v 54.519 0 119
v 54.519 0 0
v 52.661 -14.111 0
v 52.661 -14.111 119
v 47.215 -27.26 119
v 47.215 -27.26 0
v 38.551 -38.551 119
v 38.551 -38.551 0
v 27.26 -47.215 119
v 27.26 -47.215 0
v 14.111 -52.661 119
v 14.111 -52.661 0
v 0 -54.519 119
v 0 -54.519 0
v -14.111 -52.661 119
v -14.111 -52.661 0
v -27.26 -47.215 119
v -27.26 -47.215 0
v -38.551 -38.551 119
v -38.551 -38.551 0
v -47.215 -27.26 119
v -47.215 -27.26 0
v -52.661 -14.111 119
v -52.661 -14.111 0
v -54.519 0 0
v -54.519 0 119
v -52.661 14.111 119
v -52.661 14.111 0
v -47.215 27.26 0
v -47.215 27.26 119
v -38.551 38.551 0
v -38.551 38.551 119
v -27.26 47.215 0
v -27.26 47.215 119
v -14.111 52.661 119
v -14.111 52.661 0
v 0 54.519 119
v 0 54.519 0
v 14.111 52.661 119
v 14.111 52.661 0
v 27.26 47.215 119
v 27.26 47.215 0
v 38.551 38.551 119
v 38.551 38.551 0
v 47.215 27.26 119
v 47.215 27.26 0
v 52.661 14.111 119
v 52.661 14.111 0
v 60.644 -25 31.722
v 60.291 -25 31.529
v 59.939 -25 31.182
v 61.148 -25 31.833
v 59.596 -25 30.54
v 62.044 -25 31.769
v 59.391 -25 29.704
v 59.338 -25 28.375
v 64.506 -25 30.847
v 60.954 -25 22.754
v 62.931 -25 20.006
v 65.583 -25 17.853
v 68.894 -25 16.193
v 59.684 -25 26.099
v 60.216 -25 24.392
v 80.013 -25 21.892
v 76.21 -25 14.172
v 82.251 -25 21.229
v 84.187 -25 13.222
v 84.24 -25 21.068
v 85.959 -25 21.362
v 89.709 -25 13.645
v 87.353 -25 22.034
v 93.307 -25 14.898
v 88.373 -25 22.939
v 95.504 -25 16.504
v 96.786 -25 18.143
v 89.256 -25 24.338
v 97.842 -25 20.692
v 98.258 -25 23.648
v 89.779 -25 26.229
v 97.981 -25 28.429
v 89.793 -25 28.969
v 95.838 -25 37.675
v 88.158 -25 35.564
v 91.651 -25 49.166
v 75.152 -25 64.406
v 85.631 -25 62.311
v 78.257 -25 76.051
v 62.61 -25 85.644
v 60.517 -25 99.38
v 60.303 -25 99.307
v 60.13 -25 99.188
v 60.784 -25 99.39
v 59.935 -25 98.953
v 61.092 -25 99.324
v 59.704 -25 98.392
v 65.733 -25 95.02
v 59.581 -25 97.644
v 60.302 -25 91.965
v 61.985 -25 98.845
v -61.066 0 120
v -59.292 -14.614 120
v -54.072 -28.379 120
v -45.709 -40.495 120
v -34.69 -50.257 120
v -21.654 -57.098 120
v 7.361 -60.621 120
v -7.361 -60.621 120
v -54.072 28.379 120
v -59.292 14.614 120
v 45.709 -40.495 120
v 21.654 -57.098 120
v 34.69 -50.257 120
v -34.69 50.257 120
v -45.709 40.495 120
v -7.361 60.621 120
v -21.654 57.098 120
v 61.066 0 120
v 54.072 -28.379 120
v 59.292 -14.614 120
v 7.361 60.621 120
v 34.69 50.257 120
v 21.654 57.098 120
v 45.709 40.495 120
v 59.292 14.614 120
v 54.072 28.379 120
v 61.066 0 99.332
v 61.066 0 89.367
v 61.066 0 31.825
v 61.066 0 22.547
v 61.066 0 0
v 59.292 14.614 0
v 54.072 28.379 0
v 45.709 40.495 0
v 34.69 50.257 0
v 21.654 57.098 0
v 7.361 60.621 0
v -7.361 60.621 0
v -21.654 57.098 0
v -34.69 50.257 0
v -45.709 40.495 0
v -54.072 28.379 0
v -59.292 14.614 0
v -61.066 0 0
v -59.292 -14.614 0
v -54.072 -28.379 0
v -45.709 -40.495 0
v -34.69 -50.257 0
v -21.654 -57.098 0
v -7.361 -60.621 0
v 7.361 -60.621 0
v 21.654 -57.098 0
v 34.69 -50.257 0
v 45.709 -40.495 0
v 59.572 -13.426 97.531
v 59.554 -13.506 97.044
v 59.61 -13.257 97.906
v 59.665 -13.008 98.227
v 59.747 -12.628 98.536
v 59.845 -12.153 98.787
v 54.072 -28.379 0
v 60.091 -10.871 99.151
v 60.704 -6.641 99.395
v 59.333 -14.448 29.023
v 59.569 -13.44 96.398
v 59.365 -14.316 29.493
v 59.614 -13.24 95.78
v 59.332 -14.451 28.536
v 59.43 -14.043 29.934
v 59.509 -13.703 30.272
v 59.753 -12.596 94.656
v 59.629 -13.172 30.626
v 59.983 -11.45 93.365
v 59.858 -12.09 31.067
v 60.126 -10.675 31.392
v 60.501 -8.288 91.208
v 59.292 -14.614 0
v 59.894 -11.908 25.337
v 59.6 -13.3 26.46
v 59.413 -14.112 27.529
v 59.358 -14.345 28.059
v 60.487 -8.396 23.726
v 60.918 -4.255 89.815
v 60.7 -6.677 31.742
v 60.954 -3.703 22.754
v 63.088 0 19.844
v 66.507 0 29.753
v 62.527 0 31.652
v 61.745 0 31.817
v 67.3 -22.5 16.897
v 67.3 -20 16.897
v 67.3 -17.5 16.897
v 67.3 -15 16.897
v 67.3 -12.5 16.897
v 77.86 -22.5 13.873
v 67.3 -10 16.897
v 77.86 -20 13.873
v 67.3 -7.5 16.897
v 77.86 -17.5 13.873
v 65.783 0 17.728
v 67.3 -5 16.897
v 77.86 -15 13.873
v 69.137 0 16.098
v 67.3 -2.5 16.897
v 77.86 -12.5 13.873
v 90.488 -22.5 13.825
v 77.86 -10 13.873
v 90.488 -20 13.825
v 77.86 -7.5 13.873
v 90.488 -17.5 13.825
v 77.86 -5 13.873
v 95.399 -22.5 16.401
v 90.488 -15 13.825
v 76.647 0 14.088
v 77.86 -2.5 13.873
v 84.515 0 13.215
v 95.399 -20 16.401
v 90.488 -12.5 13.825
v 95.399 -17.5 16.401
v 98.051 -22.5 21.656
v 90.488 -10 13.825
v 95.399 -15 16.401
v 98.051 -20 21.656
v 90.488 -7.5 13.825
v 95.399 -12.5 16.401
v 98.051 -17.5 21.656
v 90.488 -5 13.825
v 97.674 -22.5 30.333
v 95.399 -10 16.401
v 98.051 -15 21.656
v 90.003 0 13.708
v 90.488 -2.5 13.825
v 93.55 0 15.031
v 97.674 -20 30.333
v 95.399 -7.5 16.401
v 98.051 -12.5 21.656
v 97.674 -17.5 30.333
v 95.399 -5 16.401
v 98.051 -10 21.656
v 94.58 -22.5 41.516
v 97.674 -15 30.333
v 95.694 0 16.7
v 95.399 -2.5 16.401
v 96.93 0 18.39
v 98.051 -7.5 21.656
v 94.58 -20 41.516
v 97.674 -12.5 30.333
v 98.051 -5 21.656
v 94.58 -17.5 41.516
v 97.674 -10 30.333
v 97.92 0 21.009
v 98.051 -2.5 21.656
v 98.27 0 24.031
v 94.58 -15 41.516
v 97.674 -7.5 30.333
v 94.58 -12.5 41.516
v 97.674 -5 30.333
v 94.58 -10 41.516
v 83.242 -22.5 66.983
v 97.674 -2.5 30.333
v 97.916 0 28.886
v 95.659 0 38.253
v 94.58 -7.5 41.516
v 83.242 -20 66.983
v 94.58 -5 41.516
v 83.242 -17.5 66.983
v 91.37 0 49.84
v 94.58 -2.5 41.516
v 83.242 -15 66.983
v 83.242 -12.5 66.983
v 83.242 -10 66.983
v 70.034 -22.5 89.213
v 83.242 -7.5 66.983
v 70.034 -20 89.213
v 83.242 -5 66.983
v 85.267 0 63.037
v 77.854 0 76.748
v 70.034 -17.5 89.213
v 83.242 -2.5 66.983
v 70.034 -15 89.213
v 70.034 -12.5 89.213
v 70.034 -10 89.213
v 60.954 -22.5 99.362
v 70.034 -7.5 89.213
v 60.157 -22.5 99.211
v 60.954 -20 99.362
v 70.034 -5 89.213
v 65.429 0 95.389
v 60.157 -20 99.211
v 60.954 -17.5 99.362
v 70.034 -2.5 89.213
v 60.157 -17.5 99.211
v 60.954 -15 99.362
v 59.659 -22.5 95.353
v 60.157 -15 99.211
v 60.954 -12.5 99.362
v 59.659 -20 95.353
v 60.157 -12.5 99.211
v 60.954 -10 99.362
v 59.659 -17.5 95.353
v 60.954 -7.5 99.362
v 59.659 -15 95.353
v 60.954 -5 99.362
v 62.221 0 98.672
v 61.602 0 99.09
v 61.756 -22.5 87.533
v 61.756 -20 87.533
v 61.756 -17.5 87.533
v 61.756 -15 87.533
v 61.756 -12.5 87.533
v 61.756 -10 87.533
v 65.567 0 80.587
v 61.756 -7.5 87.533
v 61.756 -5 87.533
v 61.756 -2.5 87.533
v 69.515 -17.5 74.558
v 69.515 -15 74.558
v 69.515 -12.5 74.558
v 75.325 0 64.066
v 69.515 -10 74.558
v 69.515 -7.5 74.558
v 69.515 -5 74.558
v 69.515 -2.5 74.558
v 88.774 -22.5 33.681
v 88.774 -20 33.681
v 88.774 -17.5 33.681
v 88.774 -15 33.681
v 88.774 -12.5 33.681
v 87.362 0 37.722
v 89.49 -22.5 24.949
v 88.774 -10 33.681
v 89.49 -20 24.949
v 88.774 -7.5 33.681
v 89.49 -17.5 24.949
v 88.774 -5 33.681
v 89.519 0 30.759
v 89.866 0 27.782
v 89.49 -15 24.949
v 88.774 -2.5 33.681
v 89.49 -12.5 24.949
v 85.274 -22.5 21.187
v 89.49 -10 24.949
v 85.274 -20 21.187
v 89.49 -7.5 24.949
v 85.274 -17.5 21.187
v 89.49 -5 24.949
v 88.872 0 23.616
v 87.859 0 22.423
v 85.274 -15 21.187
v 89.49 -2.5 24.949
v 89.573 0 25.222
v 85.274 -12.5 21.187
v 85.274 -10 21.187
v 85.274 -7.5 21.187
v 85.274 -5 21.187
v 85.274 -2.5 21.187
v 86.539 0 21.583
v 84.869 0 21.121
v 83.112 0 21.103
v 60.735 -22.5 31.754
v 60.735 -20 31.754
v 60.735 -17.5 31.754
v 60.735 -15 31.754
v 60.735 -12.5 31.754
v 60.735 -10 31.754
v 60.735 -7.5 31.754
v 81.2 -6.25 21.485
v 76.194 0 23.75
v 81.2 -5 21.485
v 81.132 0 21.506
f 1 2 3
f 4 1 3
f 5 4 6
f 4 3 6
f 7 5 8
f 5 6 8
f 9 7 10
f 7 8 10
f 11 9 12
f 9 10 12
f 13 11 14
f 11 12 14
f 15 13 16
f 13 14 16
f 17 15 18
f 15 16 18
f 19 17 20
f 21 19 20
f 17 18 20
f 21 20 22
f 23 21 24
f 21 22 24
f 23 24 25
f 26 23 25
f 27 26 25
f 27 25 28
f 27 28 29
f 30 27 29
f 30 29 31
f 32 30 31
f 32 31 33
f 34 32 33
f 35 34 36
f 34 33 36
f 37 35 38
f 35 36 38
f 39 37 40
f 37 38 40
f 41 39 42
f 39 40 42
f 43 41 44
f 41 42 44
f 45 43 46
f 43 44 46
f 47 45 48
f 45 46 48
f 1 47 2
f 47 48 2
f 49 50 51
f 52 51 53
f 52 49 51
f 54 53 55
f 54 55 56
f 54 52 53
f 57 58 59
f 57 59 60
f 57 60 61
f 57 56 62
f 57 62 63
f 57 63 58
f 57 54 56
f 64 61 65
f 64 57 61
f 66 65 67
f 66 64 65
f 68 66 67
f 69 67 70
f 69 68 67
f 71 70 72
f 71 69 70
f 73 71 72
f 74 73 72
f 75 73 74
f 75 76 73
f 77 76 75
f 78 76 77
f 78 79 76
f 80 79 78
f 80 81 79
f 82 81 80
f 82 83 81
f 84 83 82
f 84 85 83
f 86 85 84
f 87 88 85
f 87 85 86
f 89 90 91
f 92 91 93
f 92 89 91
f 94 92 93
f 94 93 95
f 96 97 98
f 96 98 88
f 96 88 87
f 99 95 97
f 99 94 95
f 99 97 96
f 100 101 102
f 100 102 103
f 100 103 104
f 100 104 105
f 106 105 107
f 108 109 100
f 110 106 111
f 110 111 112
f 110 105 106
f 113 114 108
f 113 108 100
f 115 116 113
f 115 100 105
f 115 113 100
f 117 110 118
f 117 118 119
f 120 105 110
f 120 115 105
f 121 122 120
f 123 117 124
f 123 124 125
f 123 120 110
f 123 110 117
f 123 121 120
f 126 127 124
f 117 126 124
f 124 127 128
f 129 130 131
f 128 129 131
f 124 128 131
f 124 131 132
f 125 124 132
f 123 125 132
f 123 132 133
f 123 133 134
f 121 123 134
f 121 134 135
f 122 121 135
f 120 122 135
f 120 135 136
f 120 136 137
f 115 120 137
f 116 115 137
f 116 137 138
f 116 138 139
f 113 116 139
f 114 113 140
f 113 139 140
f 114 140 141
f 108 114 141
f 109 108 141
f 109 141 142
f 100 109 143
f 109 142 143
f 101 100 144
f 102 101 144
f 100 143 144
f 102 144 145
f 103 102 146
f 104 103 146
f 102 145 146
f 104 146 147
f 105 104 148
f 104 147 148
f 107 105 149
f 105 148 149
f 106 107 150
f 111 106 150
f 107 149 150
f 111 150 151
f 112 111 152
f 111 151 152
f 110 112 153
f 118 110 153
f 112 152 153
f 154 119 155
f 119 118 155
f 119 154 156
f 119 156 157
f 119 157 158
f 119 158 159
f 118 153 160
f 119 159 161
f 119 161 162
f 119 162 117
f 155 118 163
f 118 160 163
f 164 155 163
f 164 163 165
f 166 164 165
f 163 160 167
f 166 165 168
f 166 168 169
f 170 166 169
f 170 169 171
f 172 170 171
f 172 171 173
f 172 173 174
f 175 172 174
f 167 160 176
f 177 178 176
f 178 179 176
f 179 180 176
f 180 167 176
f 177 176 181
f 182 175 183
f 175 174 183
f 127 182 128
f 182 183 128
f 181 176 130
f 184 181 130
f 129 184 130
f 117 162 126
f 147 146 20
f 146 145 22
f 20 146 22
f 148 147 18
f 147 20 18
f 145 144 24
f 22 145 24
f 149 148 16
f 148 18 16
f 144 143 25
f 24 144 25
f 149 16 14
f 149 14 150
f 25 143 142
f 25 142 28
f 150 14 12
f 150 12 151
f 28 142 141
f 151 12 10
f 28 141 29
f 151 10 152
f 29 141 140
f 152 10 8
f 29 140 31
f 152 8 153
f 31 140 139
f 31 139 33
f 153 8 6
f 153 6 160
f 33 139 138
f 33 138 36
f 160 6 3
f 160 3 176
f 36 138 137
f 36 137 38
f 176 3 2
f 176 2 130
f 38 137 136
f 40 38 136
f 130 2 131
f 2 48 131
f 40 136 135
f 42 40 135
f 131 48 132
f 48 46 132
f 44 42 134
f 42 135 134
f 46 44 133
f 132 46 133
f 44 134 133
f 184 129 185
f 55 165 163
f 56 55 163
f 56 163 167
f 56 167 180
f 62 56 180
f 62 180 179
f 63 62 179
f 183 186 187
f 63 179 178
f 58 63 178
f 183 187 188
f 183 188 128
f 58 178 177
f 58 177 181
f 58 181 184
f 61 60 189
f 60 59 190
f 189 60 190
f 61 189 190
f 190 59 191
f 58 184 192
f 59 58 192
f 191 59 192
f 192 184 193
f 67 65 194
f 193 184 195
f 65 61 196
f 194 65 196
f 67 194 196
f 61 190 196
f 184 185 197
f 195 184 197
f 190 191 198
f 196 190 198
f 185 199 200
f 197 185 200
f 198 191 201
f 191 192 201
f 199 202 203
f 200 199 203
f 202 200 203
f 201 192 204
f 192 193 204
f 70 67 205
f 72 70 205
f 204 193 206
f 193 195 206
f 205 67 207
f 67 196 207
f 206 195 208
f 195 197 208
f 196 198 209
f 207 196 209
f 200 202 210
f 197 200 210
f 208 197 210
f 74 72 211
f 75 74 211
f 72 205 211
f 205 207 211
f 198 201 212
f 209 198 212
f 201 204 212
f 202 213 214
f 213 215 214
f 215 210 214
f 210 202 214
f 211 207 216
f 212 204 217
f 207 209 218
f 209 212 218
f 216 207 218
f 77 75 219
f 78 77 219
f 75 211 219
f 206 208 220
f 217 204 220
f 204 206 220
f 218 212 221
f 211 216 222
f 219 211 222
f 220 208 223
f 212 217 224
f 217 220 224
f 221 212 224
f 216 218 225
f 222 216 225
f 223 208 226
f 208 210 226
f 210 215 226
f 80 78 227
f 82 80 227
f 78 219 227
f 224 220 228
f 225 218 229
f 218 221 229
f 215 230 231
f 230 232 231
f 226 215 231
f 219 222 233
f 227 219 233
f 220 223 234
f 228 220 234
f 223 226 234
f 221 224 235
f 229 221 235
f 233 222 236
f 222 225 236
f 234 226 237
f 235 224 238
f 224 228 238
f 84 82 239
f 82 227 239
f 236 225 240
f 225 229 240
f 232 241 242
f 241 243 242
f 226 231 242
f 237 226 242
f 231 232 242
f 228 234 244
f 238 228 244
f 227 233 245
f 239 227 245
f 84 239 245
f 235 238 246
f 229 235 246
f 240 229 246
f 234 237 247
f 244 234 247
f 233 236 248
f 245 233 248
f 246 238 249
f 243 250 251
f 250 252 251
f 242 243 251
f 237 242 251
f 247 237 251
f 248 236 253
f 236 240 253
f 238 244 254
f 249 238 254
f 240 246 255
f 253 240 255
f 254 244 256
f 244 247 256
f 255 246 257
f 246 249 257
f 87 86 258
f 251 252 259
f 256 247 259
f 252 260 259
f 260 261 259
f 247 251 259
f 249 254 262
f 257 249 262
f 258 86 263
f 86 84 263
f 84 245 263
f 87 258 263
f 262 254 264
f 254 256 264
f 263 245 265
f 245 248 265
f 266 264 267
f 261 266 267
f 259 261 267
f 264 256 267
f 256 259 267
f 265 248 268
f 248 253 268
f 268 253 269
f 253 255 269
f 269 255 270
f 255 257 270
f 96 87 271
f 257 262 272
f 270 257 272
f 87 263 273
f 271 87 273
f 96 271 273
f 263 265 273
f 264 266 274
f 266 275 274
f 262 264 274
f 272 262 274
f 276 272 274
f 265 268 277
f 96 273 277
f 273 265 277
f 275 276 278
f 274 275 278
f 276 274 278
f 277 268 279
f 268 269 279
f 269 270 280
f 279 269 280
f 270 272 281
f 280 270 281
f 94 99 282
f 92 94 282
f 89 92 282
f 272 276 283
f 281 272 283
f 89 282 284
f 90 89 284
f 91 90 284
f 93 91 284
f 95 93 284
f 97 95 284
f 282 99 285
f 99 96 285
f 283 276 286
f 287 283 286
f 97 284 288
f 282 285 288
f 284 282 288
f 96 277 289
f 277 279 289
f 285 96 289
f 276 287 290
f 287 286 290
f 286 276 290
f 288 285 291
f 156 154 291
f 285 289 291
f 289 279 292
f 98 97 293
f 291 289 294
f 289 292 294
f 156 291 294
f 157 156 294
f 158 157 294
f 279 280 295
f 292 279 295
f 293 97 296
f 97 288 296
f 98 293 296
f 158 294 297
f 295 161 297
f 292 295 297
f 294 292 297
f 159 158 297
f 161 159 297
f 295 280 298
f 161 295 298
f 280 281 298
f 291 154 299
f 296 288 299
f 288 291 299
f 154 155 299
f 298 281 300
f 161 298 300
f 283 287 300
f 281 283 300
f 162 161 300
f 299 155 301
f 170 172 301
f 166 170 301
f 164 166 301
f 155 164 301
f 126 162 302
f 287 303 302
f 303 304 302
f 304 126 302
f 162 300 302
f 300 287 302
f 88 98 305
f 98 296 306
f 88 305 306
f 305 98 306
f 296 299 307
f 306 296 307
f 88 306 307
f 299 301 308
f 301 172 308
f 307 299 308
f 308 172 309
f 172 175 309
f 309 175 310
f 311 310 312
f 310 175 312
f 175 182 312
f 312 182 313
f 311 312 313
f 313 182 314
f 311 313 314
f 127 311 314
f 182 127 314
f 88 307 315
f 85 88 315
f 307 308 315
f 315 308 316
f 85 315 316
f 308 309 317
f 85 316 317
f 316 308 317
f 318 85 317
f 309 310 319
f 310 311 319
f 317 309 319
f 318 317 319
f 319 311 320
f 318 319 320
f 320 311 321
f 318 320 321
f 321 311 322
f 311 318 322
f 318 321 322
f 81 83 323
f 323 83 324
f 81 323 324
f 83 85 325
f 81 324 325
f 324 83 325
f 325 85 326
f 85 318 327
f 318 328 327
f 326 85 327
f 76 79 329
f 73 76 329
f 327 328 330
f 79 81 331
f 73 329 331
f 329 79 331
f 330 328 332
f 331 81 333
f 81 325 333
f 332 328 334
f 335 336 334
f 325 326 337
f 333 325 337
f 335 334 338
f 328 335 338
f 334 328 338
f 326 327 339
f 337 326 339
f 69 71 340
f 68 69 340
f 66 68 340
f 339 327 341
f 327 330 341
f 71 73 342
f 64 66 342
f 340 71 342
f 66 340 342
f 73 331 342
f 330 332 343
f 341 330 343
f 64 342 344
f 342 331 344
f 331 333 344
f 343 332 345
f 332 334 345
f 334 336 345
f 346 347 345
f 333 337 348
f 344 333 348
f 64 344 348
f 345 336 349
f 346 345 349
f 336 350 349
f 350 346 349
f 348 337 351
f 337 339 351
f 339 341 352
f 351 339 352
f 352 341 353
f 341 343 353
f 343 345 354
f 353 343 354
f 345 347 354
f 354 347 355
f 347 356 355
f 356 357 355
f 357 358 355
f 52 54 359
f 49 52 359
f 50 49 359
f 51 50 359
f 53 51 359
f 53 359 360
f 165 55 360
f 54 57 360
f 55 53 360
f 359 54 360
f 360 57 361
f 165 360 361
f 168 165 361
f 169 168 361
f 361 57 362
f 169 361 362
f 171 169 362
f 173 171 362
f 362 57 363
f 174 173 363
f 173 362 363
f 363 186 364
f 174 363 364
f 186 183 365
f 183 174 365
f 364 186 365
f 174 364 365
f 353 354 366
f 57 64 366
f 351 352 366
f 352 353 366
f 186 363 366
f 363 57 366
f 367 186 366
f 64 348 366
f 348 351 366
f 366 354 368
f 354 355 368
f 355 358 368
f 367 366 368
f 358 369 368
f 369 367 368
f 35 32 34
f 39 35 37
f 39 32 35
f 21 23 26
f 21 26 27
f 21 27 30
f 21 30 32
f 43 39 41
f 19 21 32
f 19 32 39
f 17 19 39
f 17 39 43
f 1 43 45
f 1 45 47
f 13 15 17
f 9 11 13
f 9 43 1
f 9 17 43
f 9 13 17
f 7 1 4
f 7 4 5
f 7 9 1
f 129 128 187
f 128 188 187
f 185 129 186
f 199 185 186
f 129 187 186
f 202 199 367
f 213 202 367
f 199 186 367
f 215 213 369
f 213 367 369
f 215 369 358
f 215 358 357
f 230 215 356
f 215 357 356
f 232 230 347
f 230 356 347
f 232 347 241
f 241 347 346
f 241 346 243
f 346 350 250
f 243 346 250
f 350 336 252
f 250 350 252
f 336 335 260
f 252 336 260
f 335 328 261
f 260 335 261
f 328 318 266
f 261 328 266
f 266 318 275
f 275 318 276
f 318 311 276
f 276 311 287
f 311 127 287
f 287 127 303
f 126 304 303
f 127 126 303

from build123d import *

# Parameters (mm, degrees)
F0_R     = 61.0664695076
F1_DEPTH = 120
F2_R     = 54.5191208314
F3_DEPTH = 119
F5_DEPTH = 25


with BuildPart() as f1:
    # F0 (on Top) → F1 (new body)
    with BuildSketch(Plane.XY):
        Circle(F0_R)
    extrude(amount=F1_DEPTH)

    # F2 (on face) → F3 (cut)
    with BuildSketch(Plane(origin=(0, 0, 0), x_dir=(1, 0, 0), z_dir=(0, 0, -1))):
        Circle(F2_R)
    extrude(amount=-F3_DEPTH, mode=Mode.SUBTRACT)

    # F4 (on Front) → F5 (join)
    with BuildSketch(Plane.XZ):
        with BuildLine():
            add(Edge.make_bspline(
                [(60.9540753067, 22.753989324), (63.5270362442, 17.9072820245), (74.5876967588, 13.0445498577), (118.8166428086, 10.7091734666), (56.3598857532, 117.0218614551), (60.5600900247, 86.4345628033), (70.3703764351, 75.19630034), (83.94520842, 46.3083730277), (92.9993183363, 24.6461115443), (80.9101403901, 17.4580666818), (57.736215368, 38.7928055161), (59.1032510908, 26.2404018482), (60.9540753067, 22.753989324)],
                knots=[0, 0, 0, 0, 0.0894592502, 0.1927301216, 0.3917489591, 0.4584030931, 0.5478623528, 0.6708554205, 0.7688366425, 0.8326356808, 0.9356487135, 1, 1, 1, 1], degree=3))
        make_face()
    extrude(amount=F5_DEPTH)


solid = f1.part
